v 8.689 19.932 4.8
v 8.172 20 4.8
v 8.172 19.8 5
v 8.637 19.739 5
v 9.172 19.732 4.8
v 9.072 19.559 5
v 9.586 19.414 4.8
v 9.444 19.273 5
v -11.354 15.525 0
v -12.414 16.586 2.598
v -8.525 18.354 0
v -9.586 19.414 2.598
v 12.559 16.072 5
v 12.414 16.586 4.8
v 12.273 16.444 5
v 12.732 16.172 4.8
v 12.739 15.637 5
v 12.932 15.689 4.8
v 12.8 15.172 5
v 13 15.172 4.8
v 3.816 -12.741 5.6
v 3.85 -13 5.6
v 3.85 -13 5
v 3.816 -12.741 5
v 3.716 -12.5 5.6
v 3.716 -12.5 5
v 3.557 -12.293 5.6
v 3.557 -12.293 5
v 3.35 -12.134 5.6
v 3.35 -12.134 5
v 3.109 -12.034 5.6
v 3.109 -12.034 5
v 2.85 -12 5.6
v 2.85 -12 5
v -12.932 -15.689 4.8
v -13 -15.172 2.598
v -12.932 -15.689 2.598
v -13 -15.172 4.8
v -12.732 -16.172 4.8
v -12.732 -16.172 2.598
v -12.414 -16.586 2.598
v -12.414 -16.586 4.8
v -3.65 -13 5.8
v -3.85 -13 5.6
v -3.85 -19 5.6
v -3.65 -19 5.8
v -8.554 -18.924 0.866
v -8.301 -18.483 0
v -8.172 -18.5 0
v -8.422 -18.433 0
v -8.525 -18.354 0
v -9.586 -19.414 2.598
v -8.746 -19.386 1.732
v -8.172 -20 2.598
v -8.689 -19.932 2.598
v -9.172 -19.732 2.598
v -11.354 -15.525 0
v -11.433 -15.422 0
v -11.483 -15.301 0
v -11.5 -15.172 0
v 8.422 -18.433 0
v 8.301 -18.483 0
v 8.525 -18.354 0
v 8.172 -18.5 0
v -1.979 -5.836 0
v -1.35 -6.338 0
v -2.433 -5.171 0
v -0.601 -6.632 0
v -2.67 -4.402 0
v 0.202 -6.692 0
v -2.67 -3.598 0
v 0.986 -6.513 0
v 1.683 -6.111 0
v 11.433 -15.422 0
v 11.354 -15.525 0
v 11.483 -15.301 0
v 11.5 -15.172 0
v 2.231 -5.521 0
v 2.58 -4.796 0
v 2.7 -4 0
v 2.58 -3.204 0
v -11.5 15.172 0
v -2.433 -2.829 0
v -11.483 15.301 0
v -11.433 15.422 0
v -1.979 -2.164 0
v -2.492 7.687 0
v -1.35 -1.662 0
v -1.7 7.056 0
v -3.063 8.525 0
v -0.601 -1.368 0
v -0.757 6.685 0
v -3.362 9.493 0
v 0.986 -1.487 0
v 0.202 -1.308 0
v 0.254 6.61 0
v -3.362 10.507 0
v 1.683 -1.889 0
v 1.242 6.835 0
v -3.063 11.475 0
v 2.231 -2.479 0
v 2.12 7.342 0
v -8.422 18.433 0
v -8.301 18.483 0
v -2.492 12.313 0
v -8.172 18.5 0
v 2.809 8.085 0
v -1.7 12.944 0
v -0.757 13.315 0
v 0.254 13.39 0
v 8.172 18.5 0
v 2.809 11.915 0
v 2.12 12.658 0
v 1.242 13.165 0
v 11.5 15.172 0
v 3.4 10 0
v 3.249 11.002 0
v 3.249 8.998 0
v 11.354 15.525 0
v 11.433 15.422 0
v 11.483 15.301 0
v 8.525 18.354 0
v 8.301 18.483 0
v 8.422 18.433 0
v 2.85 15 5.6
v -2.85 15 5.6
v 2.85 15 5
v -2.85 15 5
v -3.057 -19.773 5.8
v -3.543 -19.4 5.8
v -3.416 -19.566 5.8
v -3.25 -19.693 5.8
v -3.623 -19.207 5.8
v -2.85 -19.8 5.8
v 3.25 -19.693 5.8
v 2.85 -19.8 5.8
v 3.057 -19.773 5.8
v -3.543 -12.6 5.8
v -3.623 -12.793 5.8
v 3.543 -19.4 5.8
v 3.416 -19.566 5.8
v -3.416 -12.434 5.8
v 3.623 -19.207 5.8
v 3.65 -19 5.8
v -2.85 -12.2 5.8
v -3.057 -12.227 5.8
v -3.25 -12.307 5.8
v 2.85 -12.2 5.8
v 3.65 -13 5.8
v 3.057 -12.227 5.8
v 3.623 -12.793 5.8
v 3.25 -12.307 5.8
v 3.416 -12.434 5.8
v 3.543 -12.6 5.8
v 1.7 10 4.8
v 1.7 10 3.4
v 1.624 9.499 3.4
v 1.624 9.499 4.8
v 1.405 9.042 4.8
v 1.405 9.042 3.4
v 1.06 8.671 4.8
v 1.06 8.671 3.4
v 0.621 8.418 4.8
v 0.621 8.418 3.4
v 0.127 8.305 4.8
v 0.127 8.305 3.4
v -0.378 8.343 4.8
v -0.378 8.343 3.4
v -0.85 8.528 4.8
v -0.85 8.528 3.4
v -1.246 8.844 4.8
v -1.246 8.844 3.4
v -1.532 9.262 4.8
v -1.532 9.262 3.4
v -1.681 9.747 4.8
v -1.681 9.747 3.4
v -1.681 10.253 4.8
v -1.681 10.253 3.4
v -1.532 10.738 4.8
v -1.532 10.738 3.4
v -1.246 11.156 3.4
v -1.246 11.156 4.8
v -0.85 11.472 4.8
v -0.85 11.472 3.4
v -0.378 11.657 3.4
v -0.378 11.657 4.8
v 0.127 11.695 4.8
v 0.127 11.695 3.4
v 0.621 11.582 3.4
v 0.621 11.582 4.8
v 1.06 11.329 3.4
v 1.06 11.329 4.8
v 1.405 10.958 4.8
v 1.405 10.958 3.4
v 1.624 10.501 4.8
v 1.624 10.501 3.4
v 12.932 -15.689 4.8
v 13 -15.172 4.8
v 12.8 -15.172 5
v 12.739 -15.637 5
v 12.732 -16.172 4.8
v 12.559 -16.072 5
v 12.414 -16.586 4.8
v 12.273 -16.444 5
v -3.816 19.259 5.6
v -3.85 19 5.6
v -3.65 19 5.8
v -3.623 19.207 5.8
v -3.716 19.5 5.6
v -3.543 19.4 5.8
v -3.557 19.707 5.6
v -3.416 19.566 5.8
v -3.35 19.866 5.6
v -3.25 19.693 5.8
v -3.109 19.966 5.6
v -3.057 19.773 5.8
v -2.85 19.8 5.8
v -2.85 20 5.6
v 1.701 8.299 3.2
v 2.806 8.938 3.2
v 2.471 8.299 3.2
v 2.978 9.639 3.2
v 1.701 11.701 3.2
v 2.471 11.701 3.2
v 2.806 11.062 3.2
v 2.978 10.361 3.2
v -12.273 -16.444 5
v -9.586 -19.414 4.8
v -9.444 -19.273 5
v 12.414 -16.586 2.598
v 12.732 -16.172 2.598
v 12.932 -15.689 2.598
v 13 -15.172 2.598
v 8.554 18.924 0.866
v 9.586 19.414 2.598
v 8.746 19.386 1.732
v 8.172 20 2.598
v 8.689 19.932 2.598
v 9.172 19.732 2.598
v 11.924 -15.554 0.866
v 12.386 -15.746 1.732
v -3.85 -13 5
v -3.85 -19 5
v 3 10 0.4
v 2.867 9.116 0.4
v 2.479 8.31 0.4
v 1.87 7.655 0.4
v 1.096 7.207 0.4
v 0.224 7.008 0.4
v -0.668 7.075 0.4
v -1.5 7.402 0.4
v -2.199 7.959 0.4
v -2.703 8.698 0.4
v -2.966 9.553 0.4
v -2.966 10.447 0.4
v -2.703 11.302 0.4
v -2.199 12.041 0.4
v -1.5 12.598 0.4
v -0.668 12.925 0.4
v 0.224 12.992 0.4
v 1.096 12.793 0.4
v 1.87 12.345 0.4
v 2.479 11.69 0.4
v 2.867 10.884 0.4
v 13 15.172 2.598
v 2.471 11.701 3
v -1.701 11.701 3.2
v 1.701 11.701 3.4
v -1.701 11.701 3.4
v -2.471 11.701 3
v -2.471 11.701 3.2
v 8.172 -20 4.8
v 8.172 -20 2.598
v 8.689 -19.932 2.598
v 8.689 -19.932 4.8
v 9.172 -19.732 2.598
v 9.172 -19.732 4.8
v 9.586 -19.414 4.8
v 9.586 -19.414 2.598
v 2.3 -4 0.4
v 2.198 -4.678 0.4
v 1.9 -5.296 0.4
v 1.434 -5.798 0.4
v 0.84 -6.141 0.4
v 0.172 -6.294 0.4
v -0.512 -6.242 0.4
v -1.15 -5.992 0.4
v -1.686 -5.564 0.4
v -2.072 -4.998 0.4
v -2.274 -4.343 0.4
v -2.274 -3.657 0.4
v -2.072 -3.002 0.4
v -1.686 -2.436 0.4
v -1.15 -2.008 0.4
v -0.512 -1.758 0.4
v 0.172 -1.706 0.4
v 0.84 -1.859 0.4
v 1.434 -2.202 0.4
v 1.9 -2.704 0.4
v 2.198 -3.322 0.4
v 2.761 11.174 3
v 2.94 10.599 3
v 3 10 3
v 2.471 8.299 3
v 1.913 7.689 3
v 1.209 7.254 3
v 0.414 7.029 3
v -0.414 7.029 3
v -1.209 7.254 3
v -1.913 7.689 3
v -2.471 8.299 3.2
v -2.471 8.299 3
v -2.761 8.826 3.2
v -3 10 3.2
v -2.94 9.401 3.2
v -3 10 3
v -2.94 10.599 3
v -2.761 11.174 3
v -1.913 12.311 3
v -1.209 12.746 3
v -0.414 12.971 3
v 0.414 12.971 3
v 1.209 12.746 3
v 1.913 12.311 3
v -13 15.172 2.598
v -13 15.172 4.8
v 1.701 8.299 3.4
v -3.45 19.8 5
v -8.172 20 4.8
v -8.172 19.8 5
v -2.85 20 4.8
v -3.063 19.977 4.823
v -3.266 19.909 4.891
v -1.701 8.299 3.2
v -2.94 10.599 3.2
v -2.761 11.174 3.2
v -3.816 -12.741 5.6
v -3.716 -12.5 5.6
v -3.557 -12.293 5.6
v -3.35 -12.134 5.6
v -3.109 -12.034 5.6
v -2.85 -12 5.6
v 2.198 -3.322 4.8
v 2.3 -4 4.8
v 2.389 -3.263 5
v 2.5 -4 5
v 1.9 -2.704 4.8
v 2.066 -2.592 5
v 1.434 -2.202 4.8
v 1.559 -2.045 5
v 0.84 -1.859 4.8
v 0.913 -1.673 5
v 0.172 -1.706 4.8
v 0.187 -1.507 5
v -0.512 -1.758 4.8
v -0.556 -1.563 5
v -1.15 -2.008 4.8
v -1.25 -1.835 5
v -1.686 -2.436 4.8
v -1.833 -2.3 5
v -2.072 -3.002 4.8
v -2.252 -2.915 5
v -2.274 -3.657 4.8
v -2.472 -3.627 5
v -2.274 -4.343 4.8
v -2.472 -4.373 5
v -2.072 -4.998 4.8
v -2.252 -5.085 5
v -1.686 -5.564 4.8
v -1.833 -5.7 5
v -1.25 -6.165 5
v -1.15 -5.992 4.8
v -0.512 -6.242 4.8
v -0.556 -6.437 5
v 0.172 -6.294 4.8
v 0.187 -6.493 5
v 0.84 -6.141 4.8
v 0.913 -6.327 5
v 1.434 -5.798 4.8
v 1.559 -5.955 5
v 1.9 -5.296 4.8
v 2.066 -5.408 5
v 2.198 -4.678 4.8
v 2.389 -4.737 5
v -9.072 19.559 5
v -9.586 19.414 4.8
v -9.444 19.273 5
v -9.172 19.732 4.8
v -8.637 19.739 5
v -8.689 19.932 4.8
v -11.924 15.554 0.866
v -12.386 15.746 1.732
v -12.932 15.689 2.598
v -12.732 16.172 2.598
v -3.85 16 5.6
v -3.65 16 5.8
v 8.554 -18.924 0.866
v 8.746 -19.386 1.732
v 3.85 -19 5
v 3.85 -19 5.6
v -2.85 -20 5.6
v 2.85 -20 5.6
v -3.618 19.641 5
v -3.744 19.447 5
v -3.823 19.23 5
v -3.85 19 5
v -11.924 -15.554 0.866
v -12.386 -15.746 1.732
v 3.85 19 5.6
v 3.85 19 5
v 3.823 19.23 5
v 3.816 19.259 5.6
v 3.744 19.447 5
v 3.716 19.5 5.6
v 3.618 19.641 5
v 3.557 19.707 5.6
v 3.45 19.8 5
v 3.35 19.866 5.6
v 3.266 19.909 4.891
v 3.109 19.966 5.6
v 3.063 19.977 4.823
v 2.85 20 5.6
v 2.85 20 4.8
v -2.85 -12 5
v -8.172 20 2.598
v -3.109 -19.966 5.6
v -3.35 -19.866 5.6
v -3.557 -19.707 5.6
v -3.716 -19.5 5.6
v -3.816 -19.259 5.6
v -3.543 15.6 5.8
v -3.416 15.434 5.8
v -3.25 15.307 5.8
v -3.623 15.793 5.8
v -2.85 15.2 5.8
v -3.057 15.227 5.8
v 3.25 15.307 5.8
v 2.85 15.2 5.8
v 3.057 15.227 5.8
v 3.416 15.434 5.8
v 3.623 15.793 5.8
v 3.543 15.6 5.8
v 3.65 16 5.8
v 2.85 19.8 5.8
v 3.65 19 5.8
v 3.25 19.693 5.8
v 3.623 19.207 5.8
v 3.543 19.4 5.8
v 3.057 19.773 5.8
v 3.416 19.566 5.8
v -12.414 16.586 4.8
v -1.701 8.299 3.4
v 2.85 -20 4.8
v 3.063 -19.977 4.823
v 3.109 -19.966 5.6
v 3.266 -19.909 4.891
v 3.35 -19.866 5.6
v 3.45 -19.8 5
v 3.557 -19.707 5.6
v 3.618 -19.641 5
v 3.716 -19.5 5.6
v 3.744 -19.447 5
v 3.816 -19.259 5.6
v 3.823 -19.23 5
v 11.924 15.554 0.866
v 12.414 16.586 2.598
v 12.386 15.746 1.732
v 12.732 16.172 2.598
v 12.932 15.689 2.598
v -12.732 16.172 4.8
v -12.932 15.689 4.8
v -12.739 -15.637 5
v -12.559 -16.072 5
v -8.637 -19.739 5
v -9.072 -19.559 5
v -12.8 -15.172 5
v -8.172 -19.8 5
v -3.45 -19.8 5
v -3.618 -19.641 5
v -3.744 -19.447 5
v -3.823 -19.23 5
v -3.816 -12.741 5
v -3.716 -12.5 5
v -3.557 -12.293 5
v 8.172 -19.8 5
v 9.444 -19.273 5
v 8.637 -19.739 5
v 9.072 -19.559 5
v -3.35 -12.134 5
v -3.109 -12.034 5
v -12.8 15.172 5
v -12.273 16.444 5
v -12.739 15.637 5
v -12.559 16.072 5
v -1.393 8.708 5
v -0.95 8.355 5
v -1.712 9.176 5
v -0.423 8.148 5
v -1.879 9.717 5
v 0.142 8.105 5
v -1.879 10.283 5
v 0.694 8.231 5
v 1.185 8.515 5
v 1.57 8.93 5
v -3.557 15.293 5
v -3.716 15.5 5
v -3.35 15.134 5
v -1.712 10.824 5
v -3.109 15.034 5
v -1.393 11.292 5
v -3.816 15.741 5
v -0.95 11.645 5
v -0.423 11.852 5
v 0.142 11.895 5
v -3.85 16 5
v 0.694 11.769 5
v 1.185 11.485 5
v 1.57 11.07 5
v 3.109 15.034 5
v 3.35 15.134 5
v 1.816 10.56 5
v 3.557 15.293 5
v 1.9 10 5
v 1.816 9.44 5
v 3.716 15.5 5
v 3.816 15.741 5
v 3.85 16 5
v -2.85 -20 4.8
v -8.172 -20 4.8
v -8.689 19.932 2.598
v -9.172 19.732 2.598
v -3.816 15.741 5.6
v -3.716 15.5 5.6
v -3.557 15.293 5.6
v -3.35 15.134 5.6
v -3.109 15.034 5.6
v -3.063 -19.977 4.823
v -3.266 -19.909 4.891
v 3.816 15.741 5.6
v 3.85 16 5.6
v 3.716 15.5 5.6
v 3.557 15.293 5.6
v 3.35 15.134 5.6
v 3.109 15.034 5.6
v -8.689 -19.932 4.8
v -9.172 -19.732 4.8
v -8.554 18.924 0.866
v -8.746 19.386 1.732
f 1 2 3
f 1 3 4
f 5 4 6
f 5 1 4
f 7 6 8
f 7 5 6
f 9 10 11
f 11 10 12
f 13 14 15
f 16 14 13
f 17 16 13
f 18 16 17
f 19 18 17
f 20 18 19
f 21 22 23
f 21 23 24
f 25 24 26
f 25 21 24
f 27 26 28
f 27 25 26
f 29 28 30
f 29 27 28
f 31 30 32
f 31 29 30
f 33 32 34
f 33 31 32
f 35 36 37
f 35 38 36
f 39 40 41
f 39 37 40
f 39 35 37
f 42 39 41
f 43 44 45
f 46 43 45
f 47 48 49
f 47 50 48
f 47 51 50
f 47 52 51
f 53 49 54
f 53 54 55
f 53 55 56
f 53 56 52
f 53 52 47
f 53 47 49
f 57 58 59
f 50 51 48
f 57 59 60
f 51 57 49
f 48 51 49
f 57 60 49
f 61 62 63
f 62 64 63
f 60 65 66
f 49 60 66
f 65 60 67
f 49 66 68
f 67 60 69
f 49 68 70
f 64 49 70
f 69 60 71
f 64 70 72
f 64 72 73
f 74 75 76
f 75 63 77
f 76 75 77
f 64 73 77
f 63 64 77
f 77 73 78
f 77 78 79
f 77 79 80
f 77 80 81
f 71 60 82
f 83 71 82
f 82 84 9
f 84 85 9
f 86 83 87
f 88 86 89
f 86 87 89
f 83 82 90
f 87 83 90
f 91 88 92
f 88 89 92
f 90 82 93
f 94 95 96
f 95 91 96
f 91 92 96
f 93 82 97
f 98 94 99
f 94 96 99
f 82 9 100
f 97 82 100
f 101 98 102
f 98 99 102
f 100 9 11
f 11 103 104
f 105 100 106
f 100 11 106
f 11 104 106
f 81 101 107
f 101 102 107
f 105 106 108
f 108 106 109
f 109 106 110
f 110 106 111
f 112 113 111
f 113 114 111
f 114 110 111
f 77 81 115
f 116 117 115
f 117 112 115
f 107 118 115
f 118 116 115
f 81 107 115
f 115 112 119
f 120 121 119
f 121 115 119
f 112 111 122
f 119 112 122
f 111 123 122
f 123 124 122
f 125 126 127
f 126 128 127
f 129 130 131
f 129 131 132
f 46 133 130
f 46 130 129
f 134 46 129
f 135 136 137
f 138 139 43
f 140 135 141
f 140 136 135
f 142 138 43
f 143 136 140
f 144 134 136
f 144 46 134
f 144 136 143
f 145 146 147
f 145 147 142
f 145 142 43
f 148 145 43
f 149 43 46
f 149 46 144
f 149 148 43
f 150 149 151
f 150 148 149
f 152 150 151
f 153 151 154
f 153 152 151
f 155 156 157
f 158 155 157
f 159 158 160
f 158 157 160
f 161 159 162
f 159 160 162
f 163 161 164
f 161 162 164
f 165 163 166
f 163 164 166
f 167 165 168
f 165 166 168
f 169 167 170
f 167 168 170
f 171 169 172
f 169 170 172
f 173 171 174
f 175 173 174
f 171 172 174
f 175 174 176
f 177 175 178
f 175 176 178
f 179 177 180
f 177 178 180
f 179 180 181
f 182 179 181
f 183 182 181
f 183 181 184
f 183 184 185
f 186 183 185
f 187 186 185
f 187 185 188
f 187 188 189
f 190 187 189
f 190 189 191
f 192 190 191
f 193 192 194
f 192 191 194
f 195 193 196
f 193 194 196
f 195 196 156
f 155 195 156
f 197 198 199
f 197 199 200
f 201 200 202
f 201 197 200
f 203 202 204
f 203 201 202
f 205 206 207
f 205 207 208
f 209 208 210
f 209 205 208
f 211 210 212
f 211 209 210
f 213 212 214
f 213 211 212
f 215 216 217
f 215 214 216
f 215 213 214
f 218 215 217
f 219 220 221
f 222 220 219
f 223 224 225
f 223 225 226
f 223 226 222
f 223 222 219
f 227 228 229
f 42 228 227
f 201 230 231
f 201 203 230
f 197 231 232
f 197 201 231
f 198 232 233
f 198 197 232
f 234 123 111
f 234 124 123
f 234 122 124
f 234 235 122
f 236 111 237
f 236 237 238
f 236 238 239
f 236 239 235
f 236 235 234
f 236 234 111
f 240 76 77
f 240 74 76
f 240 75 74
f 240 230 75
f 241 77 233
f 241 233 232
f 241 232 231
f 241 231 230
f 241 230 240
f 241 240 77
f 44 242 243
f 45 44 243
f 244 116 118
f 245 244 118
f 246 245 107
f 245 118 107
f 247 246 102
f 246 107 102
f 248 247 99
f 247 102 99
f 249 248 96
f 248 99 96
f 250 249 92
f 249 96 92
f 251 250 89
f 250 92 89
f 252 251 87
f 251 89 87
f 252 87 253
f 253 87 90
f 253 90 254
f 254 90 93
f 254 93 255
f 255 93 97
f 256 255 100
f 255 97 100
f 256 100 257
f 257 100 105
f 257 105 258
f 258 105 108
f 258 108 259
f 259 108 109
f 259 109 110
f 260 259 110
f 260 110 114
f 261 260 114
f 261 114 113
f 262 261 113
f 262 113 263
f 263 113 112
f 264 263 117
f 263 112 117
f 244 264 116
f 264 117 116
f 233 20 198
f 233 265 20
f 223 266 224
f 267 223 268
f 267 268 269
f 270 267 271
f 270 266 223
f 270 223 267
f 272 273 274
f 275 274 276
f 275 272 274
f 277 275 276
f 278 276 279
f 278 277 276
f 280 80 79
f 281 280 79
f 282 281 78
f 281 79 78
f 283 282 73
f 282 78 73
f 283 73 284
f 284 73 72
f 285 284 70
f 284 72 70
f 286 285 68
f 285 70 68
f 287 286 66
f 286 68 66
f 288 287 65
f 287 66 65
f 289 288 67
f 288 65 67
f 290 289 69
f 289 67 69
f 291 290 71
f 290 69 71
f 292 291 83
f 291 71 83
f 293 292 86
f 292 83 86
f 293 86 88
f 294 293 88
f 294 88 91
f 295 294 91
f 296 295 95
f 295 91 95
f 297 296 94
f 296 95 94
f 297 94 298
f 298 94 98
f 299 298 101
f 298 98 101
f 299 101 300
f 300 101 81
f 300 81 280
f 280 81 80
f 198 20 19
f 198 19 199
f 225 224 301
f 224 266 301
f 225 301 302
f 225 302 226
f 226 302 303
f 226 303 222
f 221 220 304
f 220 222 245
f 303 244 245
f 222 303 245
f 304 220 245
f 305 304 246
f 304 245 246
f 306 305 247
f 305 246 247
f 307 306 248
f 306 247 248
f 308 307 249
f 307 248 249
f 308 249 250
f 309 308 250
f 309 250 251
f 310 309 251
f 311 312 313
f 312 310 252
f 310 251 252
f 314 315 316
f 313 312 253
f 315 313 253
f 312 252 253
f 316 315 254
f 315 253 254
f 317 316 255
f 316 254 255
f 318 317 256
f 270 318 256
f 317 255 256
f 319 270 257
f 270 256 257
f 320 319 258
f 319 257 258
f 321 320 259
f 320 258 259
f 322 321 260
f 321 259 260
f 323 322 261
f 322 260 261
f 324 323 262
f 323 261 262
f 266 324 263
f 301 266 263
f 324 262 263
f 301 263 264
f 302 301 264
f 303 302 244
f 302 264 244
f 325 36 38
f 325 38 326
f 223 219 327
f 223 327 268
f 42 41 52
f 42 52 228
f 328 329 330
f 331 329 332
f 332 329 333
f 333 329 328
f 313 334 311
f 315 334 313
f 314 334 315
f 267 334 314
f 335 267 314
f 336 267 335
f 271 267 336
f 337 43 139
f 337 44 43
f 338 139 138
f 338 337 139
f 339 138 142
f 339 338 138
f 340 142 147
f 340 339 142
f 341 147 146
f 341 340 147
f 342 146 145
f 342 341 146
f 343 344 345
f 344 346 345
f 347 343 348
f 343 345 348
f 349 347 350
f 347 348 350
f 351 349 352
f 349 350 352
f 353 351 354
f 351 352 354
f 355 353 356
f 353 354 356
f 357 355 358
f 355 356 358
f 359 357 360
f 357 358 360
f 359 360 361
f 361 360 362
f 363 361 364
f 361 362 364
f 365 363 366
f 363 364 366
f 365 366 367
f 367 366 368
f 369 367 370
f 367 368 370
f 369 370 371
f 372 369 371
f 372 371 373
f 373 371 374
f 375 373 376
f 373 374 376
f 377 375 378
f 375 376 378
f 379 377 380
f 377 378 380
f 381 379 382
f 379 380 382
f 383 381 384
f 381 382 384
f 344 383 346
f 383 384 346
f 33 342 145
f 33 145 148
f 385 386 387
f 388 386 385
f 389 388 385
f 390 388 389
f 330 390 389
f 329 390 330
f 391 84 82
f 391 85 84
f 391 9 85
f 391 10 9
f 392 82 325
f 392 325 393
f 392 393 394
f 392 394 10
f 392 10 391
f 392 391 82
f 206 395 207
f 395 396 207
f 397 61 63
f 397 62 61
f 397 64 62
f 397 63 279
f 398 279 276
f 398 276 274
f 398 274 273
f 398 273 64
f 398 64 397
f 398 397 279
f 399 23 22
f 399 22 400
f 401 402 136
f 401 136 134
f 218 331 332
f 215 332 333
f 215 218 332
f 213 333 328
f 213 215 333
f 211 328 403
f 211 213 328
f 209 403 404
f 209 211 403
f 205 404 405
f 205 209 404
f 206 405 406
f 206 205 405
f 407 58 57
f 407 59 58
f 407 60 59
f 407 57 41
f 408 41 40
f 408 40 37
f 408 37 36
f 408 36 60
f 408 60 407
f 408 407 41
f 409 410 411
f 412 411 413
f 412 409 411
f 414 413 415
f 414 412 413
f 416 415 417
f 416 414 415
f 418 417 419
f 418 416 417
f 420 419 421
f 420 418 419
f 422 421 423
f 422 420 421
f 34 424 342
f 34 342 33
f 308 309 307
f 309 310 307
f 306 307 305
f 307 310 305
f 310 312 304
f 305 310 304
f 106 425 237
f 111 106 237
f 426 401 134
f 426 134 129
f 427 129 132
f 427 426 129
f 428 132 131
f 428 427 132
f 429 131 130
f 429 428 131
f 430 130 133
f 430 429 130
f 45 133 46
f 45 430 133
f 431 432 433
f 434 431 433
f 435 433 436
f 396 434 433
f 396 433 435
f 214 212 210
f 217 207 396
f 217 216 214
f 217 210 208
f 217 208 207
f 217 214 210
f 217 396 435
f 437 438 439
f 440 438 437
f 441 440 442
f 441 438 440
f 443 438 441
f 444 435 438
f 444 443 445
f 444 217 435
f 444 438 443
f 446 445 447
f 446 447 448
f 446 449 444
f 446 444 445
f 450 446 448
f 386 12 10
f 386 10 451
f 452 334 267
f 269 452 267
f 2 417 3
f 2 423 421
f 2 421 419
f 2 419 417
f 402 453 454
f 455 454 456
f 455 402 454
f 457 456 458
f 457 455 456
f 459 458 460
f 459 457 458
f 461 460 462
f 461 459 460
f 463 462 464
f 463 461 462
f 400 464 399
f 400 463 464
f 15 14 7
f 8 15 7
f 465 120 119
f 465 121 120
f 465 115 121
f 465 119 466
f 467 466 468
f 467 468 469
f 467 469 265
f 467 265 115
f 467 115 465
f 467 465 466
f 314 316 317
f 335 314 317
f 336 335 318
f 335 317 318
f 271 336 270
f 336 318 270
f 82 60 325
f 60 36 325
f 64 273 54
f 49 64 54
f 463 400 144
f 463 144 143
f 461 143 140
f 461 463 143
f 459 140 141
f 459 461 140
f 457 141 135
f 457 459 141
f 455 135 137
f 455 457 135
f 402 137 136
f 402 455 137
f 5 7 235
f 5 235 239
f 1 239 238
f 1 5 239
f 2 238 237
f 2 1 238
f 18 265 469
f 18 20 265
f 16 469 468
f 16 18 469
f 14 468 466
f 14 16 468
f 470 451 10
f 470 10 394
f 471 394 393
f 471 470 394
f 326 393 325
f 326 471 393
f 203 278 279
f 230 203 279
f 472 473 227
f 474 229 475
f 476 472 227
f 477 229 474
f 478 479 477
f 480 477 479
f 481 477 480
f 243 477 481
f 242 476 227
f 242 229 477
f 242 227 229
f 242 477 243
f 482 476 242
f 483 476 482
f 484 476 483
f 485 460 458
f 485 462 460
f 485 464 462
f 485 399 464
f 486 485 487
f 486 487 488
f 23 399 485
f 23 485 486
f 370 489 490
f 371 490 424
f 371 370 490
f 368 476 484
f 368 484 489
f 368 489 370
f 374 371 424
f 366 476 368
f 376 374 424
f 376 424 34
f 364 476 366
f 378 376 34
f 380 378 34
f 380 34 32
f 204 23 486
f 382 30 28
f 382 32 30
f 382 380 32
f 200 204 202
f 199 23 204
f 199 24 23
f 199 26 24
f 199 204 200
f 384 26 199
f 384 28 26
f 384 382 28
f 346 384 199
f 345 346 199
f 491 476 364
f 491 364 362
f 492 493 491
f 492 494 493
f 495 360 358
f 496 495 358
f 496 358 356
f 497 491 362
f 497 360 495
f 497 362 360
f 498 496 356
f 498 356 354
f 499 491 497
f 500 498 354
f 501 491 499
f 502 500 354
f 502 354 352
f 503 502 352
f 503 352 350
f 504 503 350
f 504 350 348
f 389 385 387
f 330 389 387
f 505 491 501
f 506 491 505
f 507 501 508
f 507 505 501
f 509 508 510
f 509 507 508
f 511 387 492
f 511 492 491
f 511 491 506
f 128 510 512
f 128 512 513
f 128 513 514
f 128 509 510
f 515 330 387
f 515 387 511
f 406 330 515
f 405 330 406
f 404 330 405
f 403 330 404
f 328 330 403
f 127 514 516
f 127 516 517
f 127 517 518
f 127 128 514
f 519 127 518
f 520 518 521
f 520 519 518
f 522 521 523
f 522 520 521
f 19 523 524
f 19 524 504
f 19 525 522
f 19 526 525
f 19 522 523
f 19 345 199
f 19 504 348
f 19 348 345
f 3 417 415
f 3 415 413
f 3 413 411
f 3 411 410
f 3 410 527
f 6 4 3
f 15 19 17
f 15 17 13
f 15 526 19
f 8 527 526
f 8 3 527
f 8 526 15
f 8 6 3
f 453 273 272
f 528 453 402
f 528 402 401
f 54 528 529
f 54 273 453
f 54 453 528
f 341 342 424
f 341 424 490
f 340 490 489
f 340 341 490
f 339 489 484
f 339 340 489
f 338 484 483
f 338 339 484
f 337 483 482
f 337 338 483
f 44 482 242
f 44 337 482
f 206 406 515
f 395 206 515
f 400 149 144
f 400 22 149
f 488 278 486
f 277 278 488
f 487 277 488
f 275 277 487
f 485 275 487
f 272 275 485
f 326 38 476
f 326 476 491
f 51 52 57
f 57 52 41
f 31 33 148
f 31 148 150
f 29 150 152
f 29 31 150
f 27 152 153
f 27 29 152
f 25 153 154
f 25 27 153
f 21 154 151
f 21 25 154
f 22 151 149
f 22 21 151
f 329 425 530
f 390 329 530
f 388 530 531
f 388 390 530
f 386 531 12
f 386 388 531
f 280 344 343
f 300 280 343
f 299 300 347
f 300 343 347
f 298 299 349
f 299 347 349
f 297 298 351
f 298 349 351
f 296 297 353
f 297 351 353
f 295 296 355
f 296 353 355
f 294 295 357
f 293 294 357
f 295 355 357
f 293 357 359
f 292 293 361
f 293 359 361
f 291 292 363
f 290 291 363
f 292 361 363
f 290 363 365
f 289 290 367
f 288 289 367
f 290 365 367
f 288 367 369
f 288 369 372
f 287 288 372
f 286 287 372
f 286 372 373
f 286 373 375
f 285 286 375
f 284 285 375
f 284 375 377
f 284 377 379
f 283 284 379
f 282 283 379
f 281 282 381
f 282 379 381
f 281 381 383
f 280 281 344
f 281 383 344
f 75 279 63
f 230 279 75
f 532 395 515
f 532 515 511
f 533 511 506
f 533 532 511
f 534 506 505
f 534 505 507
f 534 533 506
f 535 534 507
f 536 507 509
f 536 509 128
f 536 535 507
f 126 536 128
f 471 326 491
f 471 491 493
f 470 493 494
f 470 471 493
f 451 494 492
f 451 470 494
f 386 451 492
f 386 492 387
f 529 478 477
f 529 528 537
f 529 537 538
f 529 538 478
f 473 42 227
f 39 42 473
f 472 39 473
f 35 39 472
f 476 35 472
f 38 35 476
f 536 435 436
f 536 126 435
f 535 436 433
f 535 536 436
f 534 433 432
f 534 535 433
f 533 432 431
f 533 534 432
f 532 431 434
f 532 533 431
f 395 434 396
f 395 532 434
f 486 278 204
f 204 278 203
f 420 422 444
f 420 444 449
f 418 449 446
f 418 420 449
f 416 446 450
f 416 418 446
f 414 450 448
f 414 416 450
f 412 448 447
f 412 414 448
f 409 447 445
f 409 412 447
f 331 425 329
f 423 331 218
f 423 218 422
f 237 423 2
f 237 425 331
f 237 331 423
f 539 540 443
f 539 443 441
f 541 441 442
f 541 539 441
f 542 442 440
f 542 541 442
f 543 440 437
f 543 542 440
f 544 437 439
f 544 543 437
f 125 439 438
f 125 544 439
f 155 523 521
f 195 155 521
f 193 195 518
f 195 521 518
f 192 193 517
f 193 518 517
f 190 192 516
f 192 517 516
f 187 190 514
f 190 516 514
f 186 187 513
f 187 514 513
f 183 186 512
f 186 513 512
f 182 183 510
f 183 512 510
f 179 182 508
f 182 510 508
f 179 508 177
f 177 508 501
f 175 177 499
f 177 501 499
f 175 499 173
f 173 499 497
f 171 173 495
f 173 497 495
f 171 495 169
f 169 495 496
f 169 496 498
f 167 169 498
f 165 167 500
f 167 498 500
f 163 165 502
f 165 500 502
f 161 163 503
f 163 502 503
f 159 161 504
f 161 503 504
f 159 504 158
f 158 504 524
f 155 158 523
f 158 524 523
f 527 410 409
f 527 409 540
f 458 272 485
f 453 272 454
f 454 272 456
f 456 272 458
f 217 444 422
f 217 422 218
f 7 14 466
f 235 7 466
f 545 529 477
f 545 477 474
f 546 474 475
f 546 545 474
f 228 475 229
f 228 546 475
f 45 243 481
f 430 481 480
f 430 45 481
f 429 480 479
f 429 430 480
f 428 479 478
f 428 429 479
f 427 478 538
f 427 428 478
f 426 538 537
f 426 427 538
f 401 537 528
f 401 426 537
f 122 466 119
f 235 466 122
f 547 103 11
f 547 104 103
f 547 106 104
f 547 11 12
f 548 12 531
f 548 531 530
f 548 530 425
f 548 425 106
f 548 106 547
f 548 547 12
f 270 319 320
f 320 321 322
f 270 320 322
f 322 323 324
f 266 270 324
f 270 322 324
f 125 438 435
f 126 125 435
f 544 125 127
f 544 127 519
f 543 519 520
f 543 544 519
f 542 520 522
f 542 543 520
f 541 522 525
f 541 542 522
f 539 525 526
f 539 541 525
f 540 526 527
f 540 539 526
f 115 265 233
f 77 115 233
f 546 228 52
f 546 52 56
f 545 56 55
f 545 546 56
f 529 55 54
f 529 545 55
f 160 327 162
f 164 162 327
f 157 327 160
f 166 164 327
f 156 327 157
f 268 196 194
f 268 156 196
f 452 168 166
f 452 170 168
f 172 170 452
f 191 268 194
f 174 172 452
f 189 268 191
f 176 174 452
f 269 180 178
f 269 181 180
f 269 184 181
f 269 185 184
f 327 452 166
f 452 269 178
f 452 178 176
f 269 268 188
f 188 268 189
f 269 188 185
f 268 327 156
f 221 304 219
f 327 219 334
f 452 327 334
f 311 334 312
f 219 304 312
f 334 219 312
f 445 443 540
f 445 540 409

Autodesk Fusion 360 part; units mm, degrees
sketch "Sketch1" plane through (0, 0, 0) normal (0, 0, 1) x (1, 0, 0)
  line L0 (13, -20) -> (-13, -20)
  line L1 (-13, -20) -> (-13, 20)
  line L2 (-13, 20) -> (13, 20)
  line L3 (13, 20) -> (13, -20)
  line L4 (13, -20) -> (-13, 20) construction
  line L5 (-13, -20) -> (13, 20) construction
  line L6 (0, 20) -> (0, -20)
  circle A0 centre (0, -4) radius 7
  circle A1 centre (0, 10) radius 1.7
  circle A2 centre (0, 10) radius 3
  line L7 (-3.85, 20) -> (-3.85, -20)
  line L8 (3.85, 20) -> (3.85, -20)
  circle A3 centre (0, -4) radius 1.7
  circle A4 centre (0, -4) radius 2.3
  line L9 (-3.85, 15) -> (3.85, 15)
  line L10 (-3.85, 5) -> (3.85, 5)
  line L11 (-3.85, -12) -> (3.85, -12)
  dimension "d1" = 26
  dimension "d2" = 40
  dimension "d3" = 14
  dimension "d4" = 16
  dimension "d5" = 3.4
  dimension "d6" = 6
  dimension "d7" = 7.7
  dimension "d8" = 10
  dimension "d9" = 3.4
  dimension "d10" = 4.6
  dimension "d15" = 5
  dimension "d16" = 5
  dimension "d17" = 8
extrude "Extrude1" add sketch "Sketch1" along normal blind 5
extrude "Extrude13" cut sketch "Sketch1" along normal blind 10 contours L6 A3 | L6 A3 | L6 A1 | L6 A1
extrude "Extrude2" add sketch "Sketch1" along normal blind 0.8 from surface at 5 contours L0 L6 L8 L11 | L0 L6 L7 L11 | L2 L6 L8 L9 | L2 L6 L7 L9
fillet "Fillet1" radius 1 8 edges at (-3.85, 20, 5.4) (-3.85, 15, 5.4) (-3.85, -12, 5.4) (-3.85, -20, 5.4) (3.85, -12, 5.4) (3.85, -20, 5.4) (3.85, 15, 5.4) (3.85, 20, 5.4)
chamfer "Chamfer1" distance 0.2 angle 45 16 edges at (3.5571, 15.2929, 5.8) (0, 15, 5.8) (-3.5571, 15.2929, 5.8) (-3.85, 17.5, 5.8) (-3.5571, 19.7071, 5.8) (0, 20, 5.8) (3.5571, 19.7071, 5.8) (3.85, 17.5, 5.8) (3.5571, -19.7071, 5.8) (0, -20, 5.8) (-3.5571, -19.7071, 5.8) (-3.85, -16, 5.8) (-3.5571, -12.2929, 5.8) (0, -12, 5.8) (3.5571, -12.2929, 5.8) (3.85, -16, 5.8)
extrude "Extrude3" cut sketch "Sketch1" along normal blind 3 contours L6 A1 A2 | L6 A1 A2 | L6 A1 | L6 A1
extrude "Extrude5" cut sketch "Sketch1" against normal blind 5 from surface at 5 contours L6 A3 A4 | L6 A3 A4
chamfer "Chamfer3" distance 4 angle 45 4 edges at (13, -20, 2.5) (-13, -20, 2.5) (-13, 20, 2.5) (13, 20, 2.5)
fillet "Fillet2" radius 2 8 edges at (9, -20, 2.5) (-13, 16, 2.5) (13, -16, 2.5) (13, 16, 2.5) (9, 20, 2.5) (-9, 20, 2.5) (-13, -16, 2.5) (-9, -20, 2.5)
chamfer "Chamfer4" distance 0.2 angle 45 20 edges at (-2.1444, -3.1683, 5) (11, 18, 5) (8.9369, 19.8478, 5) (5.5108, 20, 5) (5.5108, -20, 5) (8.9369, -19.8478, 5) (11, -18, 5) (12.8478, -15.9369, 5) (13, 0, 5) (12.8478, 15.9369, 5) (-11, 18, 5) (-12.8478, 15.9369, 5) (-13, 0, 5) (-12.8478, -15.9369, 5) (-11, -18, 5) (-8.9369, -19.8478, 5) (-5.5108, -20, 5) (-5.5108, 20, 5) (-8.9369, 19.8478, 5) (-1.585, 10.6147, 5)
chamfer "Chamfer5" distance 1.5 angle 60 16 edges at (13, 0, 0) (12.8478, -15.9369, 0) (11, -18, 0) (8.9369, -19.8478, 0) (0, -20, 0) (-8.9369, -19.8478, 0) (-11, -18, 0) (-12.8478, -15.9369, 0) (-13, 0, 0) (-12.8478, 15.9369, 0) (-11, 18, 0) (-8.9369, 19.8478, 0) (0, 20, 0) (8.9369, 19.8478, 0) (11, 18, 0) (12.8478, 15.9369, 0) measured on face at (9.4248, -1.2191, 0) measured on face at (12.5321, -16.4571, 1.6) measured on face at (10.5286, -18.4714, 3.2) measured on face at (9.4571, -19.5321, 1.6) measured on face at (9.4248, -1.2191, 0) measured on face at (-8.8556, -19.8794, 1.6) measured on face at (-11.4714, -17.5286, 1.6) measured on face at (-12.6868, -16.2462, 1.6) measured on face at (9.4248, -1.2191, 0) measured on face at (-12.9981, 15.2588, 3.2) measured on face at (-11.4714, 17.5286, 3.2) measured on face at (-8.5189, 19.9696, 3.2) measured on face at (9.4248, -1.2191, 0) measured on face at (9.0168, 19.8126, 1.6) measured on face at (11.4714, 17.5286, 3.2) measured on face at (12.8794, 15.8556, 1.6)
chamfer "Chamfer6" distance 0.4 angle 45 2 edges at (-2.797, 8.9152, 0) (-2.1444, -4.8317, 0) measured on face at (0.0573, -14.4312, 0) measured on face at (0.0573, -14.4312, 0)
sketch "Sketch11" plane through (0, 0, 3) normal (0, 0, -1) x (-1, 0, 0)
  circle A0 centre (0, 10) radius 1.7 construction
  circle A1 centre (0, 10) radius 3
  line L0 (0, 10) -> (1, 10) construction
  line L1 (-2.4712, 8.299) -> (2.4712, 8.299)
  line L2 (-2.4712, 11.701) -> (2.4712, 11.701)
  line L3 (0, 10) -> (0, 8.299) construction
  line L4 (0, 10) -> (0, 11.701) construction
  dimension "d87" = 1.701
  dimension "d88" = 1.701
extrude "Extrude16" cut sketch "Sketch11" against normal blind 0.2 contours A1 L1 L2
sketch "Sketch12" plane through (0, 0, 3.2) normal (0, 0, -1) x (-1, 0, 0)
  circle A0 centre (0, 10) radius 1.7 construction
  line L0 (-2.4712, 8.299) -> (2.4712, 8.299)
  arc A1 (2.4712, 8.299) -> (2.4712, 11.701) centre (0, 10) ccw
  line L1 (2.4712, 11.701) -> (-2.4712, 11.701)
  arc A2 (-2.4712, 11.701) -> (-2.4712, 8.299) centre (0, 10) ccw
  line L2 (0, 10) -> (1, 10) construction
  line L3 (0, 10) -> (0, 11) construction
  line L4 (1.701, 8.299) -> (1.701, 11.701)
  line L5 (-1.701, 8.299) -> (-1.701, 11.701)
  line L6 (0, 10) -> (1.701, 10) construction
  line L7 (0, 10) -> (-1.701, 10) construction
  dimension "d91" = 90
  dimension "d92" = 1.701
  dimension "d93" = 1.701
extrude "Extrude17" cut sketch "Sketch12" against normal blind 0.2 contours L0 L1 L4 L5
equation "d1 = 30 mm - 4 mm"
equation "d2 = 30 mm + 10 mm"
equation "d7 = 8 mm - 0.3 mm"
equation "d16 = d15"
equation "d17 = ( d3 / 2 ) + 1 mm"
